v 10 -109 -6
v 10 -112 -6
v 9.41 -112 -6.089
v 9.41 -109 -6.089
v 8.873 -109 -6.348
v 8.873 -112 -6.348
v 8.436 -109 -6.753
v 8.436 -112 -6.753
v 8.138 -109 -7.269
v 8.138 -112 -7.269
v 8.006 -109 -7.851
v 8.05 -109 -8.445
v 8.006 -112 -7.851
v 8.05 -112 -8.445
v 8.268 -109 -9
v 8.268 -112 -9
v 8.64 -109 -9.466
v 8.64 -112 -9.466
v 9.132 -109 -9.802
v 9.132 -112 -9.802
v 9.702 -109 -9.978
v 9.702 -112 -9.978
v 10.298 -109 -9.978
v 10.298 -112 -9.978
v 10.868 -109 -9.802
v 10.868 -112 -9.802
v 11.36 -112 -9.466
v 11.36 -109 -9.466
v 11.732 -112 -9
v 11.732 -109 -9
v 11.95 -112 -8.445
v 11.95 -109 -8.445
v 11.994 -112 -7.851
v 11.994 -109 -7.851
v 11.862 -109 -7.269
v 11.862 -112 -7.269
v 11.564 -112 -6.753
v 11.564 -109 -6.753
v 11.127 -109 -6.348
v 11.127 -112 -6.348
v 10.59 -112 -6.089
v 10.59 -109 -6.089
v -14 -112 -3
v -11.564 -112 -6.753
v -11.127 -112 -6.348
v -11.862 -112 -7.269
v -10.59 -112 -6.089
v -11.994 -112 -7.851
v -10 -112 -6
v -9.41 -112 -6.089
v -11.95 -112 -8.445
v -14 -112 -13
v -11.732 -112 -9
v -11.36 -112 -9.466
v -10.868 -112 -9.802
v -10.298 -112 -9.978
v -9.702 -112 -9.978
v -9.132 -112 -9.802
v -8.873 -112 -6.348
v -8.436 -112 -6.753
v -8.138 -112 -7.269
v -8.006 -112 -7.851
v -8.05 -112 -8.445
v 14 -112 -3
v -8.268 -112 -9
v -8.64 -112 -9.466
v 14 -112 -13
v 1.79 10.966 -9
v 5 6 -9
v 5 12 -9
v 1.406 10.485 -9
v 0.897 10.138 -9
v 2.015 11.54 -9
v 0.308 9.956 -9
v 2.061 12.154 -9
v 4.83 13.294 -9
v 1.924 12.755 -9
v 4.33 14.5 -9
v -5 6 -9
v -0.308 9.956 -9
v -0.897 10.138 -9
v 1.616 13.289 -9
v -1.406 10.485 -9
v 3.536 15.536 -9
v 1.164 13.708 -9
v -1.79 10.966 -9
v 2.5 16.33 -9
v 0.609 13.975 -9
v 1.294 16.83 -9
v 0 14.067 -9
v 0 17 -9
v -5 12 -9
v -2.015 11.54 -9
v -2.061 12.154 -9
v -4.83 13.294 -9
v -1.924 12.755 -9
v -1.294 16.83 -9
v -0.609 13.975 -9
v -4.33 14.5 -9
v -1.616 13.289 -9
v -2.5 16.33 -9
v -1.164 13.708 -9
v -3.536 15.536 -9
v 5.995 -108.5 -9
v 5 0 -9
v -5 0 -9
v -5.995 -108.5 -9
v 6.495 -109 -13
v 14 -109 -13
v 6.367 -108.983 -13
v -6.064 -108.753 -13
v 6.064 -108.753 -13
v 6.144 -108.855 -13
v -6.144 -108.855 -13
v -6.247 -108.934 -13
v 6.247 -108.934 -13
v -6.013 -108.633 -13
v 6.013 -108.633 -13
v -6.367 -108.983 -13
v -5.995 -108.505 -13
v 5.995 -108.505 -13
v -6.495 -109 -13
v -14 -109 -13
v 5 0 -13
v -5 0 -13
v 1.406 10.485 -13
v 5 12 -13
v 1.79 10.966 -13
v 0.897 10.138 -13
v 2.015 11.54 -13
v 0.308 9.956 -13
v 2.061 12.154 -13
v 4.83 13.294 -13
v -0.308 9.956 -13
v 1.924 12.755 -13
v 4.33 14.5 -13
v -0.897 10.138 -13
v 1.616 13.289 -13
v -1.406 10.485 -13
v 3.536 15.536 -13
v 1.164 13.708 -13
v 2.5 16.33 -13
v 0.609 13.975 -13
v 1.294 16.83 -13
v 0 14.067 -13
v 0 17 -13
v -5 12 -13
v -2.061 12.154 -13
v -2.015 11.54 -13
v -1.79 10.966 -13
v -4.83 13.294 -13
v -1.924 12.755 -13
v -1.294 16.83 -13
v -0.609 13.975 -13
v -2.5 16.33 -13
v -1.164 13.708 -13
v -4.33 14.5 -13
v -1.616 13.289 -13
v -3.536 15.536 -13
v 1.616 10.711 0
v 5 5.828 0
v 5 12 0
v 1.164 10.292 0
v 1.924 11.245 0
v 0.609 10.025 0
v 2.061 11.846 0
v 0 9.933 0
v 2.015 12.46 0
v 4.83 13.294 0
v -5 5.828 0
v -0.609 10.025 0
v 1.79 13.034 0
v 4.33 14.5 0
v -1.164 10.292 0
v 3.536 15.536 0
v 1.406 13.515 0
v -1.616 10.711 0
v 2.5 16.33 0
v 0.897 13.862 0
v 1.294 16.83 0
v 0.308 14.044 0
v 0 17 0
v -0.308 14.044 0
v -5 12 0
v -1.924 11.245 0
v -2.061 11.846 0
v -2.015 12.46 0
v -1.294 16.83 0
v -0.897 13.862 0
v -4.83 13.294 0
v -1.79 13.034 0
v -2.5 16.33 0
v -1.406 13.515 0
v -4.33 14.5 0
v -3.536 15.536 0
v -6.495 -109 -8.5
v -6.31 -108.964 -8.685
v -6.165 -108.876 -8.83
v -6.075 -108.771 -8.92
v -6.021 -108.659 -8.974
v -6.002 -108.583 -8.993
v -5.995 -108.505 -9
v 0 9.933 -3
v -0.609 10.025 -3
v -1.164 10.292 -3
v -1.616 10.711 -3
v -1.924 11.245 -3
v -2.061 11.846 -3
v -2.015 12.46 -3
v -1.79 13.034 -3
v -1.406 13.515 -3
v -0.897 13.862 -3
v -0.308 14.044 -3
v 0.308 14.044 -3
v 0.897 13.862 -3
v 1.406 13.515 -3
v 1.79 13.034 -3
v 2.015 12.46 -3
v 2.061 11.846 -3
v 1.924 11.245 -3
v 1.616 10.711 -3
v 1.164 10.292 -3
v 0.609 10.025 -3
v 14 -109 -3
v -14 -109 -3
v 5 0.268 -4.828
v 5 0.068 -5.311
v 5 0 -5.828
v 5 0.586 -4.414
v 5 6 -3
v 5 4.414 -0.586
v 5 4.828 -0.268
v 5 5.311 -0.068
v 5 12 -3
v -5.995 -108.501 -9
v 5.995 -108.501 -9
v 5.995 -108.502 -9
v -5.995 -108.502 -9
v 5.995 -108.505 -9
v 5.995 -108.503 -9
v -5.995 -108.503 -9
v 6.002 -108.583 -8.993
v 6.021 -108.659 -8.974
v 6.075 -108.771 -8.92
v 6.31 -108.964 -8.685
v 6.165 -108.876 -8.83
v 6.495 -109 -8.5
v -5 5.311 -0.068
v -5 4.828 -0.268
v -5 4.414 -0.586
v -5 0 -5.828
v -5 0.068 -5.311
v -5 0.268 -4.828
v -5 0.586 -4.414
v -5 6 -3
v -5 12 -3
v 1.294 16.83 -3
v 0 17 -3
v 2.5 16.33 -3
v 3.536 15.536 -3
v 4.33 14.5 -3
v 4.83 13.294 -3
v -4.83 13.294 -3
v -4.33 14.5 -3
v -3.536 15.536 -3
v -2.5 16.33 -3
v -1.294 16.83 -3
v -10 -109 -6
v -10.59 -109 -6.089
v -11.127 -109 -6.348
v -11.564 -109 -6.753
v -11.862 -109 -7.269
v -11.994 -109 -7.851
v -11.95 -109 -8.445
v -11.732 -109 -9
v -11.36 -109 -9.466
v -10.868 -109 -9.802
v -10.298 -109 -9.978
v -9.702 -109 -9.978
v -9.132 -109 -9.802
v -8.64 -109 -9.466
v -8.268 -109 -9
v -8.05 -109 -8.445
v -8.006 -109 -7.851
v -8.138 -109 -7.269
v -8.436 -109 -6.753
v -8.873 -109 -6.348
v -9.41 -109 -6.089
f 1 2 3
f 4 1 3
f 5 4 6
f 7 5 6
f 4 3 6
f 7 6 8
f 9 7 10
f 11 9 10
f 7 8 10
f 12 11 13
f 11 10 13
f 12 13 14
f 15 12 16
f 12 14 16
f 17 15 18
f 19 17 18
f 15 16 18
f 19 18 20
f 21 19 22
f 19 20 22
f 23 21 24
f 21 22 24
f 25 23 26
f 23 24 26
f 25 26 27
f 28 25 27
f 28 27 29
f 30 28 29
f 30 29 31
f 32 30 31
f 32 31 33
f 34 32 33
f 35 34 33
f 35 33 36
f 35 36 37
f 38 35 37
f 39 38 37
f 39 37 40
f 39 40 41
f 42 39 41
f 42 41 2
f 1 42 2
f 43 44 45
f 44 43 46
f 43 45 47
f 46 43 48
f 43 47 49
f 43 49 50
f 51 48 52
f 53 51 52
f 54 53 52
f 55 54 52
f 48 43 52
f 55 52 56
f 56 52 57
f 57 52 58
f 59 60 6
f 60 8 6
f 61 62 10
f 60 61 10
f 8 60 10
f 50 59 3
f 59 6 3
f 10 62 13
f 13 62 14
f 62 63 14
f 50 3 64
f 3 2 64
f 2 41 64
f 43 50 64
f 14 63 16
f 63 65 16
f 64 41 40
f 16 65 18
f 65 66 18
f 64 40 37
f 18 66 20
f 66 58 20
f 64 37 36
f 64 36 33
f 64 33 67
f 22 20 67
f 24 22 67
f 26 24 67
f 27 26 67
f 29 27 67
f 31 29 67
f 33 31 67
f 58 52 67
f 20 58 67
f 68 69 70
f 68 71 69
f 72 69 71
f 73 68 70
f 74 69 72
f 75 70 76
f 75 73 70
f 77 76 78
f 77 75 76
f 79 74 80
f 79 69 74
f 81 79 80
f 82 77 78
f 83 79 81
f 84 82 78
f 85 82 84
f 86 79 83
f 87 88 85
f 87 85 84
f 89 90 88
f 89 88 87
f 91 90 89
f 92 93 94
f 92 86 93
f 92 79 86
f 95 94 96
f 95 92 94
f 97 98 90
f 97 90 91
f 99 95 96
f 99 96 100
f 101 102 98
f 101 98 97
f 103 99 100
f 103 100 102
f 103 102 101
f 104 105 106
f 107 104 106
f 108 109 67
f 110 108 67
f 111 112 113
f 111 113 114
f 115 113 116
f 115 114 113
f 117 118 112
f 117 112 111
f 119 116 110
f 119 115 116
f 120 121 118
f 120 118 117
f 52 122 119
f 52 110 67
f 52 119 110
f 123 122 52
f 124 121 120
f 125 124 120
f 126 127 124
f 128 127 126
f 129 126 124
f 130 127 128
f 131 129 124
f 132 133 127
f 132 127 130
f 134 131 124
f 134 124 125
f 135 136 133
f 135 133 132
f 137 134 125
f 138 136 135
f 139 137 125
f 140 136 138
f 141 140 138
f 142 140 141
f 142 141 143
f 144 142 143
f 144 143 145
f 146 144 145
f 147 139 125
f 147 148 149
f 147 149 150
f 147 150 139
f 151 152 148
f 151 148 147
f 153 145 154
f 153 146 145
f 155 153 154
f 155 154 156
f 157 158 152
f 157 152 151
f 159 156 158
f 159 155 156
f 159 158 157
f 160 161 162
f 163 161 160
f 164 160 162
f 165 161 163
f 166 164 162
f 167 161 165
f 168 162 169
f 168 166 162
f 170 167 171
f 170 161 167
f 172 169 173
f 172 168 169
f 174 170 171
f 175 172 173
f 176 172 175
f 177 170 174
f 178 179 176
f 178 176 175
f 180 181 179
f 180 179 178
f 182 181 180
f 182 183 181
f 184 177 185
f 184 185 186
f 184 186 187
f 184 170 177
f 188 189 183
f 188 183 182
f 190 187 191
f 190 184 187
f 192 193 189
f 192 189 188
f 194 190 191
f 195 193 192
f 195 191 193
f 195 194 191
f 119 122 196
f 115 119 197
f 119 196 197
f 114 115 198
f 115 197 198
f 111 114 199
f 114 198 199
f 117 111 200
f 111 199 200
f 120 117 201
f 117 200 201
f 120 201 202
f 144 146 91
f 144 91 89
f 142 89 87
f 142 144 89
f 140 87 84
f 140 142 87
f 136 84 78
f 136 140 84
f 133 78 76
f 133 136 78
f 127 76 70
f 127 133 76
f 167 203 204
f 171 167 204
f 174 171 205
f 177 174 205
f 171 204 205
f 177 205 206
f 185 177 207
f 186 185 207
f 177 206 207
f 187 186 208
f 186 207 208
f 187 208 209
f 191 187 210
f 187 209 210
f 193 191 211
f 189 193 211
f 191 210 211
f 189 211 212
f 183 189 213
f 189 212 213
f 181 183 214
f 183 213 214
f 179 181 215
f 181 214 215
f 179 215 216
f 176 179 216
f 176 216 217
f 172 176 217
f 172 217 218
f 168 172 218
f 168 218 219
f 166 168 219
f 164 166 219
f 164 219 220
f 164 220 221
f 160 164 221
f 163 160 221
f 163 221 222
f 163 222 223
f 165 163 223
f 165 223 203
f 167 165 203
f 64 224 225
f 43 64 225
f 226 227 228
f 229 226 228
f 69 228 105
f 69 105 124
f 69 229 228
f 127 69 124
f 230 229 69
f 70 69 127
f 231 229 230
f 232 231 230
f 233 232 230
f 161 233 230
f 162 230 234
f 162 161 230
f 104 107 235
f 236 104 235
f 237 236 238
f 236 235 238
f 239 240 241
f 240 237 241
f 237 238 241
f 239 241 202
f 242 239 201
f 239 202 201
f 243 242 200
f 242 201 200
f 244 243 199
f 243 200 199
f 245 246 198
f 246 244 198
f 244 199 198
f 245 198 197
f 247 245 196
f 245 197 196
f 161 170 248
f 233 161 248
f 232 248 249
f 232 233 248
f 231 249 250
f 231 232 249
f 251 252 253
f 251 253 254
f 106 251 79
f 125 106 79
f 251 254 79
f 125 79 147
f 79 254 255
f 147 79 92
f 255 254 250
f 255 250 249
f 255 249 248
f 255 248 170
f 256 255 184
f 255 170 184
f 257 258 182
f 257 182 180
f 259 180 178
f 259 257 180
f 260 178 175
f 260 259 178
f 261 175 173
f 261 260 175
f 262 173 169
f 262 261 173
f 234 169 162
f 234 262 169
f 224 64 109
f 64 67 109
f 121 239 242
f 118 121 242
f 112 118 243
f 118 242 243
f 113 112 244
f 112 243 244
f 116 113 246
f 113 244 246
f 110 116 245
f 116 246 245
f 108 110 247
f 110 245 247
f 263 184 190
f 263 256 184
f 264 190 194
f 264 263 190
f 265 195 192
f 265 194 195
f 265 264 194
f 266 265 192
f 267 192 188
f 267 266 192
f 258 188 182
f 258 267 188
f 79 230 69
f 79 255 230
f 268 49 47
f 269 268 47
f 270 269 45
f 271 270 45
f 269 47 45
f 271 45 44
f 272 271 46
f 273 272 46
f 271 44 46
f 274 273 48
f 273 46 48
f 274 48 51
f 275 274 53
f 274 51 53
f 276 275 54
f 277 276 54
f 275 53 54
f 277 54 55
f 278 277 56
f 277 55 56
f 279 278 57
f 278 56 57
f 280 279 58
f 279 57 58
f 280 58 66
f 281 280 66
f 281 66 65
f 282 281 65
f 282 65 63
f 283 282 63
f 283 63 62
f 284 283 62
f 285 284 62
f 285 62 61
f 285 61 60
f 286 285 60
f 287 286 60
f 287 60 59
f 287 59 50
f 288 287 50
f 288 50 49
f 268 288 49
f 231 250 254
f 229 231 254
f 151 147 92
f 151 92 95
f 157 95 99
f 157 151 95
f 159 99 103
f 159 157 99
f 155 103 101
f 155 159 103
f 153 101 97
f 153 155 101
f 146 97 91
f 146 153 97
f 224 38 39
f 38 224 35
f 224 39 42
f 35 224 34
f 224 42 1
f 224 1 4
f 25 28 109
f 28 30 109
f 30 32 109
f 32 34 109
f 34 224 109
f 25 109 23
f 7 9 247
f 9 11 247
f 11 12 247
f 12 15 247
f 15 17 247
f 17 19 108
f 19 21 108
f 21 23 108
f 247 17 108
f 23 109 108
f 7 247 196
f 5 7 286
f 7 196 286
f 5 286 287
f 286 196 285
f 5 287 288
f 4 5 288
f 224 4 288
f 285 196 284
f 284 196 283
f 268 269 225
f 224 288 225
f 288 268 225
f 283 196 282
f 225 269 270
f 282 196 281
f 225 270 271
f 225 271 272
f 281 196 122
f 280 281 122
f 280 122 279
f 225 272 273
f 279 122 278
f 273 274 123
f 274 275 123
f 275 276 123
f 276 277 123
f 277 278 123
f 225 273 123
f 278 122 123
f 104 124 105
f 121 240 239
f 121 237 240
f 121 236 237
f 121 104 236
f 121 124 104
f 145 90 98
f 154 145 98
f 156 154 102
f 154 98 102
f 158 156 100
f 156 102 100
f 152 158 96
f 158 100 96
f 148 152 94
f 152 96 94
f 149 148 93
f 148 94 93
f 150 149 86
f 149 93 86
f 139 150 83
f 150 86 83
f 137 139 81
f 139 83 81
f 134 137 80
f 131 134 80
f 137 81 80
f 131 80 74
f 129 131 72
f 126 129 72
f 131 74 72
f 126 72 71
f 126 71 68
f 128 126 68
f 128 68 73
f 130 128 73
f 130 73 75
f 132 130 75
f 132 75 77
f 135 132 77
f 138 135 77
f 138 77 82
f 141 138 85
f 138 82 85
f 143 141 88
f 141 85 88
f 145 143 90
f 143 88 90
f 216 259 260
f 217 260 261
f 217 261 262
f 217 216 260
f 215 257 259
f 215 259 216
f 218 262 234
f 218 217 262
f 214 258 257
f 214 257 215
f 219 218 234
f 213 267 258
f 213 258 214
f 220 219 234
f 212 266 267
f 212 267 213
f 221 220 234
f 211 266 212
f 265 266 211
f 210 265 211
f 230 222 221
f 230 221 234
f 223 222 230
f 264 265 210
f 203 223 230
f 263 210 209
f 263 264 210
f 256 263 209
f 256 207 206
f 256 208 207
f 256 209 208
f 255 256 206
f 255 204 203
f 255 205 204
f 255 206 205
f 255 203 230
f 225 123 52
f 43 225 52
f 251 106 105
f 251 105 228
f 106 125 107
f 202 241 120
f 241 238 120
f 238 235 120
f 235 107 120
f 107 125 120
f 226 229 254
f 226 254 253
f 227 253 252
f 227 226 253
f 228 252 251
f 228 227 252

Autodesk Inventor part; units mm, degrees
ref_plane "YZ Plane" through (0, 0, 0) normal (1, 0, 0) x (0, 1, 0)
ref_plane "XZ Plane" through (0, 0, 0) normal (0, 1, 0) x (-1, 0, 0)
ref_plane "XY Plane" through (0, 0, 0) normal (0, 0, 1) x (1, 0, 0)
sketch "Skizze1" plane through (0, 0, 0) normal (0, 1, 0) x (-1, 0, 0)
  point P0 (0, 0)
sketch "Skizze2" plane through (0, 0, 0) normal (1, 0, 0) x (0, 1, 0)
  line L0 (5, 0) -> (17, 0)
  line L1 (17, -13) -> (0, -13)
  line L2 (0, -13) -> (0, -5)
  line L3 (5, 0) -> (0, -5)
  line L4 (17, -3) -> (6, -3)
  line L5 (6, -3) -> (6, -9)
  line L6 (6, -9) -> (17, -9)
  line L7 (17, 0) -> (17, -3)
  line L8 (17, -9) -> (17, -13)
  point P0 (0, 0)
  point P1 (17, -11)
  dimension "d1" = 13
  dimension "d2" = 5
  dimension "d5" = 3
  dimension "d6" = 4
  dimension "d7" = 11
  dimension "d8" = 12
  dimension "d9" = 17
extrude "Extrusion1" add sketch "Skizze2" along normal mid plane 10
fillet "Rundung1" radius 5 2 edges at (5, 17, -1.5) (-5, 17, -1.5)
fillet "Rundung2" radius 5 2 edges at (5, 17, -11) (-5, 17, -11)
sketch "Skizze4" plane through (5, 0, -13) normal (0, 0, -1) x (-1, 0, 0)
  arc A0 (10, 12) -> (0, 12) centre (5, 12) ccw projected
  point P0 (5, 0)
hole "Bohrung1" at (0, 12, -13) direction (0, 0, 1) diameter 4.134 depth 4 thread size "M5x0.8" class "6H" standard "ISO Metric profile"
sketch "Skizze5" plane through (-5, 5, 0) normal (0, 0, 1) x (1, 0, 0)
  arc A0 (10, 7) -> (0, 7) centre (5, 7) ccw projected
  point P0 (5, -5)
hole "Bohrung2" at (0, 12, 0) direction (0, 0, -1) diameter 4.134 depth 3 thread size "M5x0.8" class "6H" standard "ISO Metric profile"
sketch "Skizze6" plane through (5, 0, -13) normal (0, 0, -1) x (-1, 0, 0)
  line L0 (0, 0) -> (-1, -109)
  line L1 (10, 0) -> (0, 0) projected
  line L2 (10, 0) -> (11, -109)
  line L3 (5, 0) -> (5, -23.6685) construction
  line L4 (-1, -109) -> (11, -109)
  circle A0 centre (5, 12) radius 2.067 projected
  dimension "d29" = 12
  dimension "d30" = 121
extrude "Extrusion2" add sketch "Skizze6" against normal blind 4 contours L1 L2 L4 L0
fillet "Rundung3" radius 2 2 edges at (0, 0, -5) (0, 5, 0)
sketch "Skizze7" plane through (0, 12, -13) normal (0, 0, -1) x (-1, 0, 0)
  line L0 (-14, -121) -> (14, -121)
  line L1 (14, -121) -> (14, -124)
  line L2 (14, -124) -> (-14, -124)
  line L3 (-14, -124) -> (-14, -121)
  line L4 (-6, -121) -> (6, -121) projected
  point P0 (0, -12)
  point P1 (0, -124)
  point P2 (0, -121)
  point P3 (0, -121)
  dimension "d34" = 28
  dimension "d35" = 3
extrude "Extrusion3" add sketch "Skizze7" against normal blind 10
fillet "Rundung4" radius 0.5 3 edges at (6, -109, -11) (-6, -109, -11) (0, -109, -9)
sketch "Skizze8" plane through (-14, -109, -3) normal (0, 1, 0) x (1, 0, 0)
  line L0 (9, 10) -> (19, 10) projected
  line L1 (0, 10) -> (0, 0) projected
  point P0 (14, -3)
  point P1 (4, 5)
  point P2 (24, 5)
  point P3 (14, 10)
  point P4 (14, 10)
  point P5 (0, 5)
  dimension "d46" = 10
  dimension "d47" = 10
hole "Bohrung3" at (-10, -109, -8) at (10, -109, -8) direction (0, -1, 0) diameter 4 depth 3
properties part number "205" material "Aluminium 6061"
